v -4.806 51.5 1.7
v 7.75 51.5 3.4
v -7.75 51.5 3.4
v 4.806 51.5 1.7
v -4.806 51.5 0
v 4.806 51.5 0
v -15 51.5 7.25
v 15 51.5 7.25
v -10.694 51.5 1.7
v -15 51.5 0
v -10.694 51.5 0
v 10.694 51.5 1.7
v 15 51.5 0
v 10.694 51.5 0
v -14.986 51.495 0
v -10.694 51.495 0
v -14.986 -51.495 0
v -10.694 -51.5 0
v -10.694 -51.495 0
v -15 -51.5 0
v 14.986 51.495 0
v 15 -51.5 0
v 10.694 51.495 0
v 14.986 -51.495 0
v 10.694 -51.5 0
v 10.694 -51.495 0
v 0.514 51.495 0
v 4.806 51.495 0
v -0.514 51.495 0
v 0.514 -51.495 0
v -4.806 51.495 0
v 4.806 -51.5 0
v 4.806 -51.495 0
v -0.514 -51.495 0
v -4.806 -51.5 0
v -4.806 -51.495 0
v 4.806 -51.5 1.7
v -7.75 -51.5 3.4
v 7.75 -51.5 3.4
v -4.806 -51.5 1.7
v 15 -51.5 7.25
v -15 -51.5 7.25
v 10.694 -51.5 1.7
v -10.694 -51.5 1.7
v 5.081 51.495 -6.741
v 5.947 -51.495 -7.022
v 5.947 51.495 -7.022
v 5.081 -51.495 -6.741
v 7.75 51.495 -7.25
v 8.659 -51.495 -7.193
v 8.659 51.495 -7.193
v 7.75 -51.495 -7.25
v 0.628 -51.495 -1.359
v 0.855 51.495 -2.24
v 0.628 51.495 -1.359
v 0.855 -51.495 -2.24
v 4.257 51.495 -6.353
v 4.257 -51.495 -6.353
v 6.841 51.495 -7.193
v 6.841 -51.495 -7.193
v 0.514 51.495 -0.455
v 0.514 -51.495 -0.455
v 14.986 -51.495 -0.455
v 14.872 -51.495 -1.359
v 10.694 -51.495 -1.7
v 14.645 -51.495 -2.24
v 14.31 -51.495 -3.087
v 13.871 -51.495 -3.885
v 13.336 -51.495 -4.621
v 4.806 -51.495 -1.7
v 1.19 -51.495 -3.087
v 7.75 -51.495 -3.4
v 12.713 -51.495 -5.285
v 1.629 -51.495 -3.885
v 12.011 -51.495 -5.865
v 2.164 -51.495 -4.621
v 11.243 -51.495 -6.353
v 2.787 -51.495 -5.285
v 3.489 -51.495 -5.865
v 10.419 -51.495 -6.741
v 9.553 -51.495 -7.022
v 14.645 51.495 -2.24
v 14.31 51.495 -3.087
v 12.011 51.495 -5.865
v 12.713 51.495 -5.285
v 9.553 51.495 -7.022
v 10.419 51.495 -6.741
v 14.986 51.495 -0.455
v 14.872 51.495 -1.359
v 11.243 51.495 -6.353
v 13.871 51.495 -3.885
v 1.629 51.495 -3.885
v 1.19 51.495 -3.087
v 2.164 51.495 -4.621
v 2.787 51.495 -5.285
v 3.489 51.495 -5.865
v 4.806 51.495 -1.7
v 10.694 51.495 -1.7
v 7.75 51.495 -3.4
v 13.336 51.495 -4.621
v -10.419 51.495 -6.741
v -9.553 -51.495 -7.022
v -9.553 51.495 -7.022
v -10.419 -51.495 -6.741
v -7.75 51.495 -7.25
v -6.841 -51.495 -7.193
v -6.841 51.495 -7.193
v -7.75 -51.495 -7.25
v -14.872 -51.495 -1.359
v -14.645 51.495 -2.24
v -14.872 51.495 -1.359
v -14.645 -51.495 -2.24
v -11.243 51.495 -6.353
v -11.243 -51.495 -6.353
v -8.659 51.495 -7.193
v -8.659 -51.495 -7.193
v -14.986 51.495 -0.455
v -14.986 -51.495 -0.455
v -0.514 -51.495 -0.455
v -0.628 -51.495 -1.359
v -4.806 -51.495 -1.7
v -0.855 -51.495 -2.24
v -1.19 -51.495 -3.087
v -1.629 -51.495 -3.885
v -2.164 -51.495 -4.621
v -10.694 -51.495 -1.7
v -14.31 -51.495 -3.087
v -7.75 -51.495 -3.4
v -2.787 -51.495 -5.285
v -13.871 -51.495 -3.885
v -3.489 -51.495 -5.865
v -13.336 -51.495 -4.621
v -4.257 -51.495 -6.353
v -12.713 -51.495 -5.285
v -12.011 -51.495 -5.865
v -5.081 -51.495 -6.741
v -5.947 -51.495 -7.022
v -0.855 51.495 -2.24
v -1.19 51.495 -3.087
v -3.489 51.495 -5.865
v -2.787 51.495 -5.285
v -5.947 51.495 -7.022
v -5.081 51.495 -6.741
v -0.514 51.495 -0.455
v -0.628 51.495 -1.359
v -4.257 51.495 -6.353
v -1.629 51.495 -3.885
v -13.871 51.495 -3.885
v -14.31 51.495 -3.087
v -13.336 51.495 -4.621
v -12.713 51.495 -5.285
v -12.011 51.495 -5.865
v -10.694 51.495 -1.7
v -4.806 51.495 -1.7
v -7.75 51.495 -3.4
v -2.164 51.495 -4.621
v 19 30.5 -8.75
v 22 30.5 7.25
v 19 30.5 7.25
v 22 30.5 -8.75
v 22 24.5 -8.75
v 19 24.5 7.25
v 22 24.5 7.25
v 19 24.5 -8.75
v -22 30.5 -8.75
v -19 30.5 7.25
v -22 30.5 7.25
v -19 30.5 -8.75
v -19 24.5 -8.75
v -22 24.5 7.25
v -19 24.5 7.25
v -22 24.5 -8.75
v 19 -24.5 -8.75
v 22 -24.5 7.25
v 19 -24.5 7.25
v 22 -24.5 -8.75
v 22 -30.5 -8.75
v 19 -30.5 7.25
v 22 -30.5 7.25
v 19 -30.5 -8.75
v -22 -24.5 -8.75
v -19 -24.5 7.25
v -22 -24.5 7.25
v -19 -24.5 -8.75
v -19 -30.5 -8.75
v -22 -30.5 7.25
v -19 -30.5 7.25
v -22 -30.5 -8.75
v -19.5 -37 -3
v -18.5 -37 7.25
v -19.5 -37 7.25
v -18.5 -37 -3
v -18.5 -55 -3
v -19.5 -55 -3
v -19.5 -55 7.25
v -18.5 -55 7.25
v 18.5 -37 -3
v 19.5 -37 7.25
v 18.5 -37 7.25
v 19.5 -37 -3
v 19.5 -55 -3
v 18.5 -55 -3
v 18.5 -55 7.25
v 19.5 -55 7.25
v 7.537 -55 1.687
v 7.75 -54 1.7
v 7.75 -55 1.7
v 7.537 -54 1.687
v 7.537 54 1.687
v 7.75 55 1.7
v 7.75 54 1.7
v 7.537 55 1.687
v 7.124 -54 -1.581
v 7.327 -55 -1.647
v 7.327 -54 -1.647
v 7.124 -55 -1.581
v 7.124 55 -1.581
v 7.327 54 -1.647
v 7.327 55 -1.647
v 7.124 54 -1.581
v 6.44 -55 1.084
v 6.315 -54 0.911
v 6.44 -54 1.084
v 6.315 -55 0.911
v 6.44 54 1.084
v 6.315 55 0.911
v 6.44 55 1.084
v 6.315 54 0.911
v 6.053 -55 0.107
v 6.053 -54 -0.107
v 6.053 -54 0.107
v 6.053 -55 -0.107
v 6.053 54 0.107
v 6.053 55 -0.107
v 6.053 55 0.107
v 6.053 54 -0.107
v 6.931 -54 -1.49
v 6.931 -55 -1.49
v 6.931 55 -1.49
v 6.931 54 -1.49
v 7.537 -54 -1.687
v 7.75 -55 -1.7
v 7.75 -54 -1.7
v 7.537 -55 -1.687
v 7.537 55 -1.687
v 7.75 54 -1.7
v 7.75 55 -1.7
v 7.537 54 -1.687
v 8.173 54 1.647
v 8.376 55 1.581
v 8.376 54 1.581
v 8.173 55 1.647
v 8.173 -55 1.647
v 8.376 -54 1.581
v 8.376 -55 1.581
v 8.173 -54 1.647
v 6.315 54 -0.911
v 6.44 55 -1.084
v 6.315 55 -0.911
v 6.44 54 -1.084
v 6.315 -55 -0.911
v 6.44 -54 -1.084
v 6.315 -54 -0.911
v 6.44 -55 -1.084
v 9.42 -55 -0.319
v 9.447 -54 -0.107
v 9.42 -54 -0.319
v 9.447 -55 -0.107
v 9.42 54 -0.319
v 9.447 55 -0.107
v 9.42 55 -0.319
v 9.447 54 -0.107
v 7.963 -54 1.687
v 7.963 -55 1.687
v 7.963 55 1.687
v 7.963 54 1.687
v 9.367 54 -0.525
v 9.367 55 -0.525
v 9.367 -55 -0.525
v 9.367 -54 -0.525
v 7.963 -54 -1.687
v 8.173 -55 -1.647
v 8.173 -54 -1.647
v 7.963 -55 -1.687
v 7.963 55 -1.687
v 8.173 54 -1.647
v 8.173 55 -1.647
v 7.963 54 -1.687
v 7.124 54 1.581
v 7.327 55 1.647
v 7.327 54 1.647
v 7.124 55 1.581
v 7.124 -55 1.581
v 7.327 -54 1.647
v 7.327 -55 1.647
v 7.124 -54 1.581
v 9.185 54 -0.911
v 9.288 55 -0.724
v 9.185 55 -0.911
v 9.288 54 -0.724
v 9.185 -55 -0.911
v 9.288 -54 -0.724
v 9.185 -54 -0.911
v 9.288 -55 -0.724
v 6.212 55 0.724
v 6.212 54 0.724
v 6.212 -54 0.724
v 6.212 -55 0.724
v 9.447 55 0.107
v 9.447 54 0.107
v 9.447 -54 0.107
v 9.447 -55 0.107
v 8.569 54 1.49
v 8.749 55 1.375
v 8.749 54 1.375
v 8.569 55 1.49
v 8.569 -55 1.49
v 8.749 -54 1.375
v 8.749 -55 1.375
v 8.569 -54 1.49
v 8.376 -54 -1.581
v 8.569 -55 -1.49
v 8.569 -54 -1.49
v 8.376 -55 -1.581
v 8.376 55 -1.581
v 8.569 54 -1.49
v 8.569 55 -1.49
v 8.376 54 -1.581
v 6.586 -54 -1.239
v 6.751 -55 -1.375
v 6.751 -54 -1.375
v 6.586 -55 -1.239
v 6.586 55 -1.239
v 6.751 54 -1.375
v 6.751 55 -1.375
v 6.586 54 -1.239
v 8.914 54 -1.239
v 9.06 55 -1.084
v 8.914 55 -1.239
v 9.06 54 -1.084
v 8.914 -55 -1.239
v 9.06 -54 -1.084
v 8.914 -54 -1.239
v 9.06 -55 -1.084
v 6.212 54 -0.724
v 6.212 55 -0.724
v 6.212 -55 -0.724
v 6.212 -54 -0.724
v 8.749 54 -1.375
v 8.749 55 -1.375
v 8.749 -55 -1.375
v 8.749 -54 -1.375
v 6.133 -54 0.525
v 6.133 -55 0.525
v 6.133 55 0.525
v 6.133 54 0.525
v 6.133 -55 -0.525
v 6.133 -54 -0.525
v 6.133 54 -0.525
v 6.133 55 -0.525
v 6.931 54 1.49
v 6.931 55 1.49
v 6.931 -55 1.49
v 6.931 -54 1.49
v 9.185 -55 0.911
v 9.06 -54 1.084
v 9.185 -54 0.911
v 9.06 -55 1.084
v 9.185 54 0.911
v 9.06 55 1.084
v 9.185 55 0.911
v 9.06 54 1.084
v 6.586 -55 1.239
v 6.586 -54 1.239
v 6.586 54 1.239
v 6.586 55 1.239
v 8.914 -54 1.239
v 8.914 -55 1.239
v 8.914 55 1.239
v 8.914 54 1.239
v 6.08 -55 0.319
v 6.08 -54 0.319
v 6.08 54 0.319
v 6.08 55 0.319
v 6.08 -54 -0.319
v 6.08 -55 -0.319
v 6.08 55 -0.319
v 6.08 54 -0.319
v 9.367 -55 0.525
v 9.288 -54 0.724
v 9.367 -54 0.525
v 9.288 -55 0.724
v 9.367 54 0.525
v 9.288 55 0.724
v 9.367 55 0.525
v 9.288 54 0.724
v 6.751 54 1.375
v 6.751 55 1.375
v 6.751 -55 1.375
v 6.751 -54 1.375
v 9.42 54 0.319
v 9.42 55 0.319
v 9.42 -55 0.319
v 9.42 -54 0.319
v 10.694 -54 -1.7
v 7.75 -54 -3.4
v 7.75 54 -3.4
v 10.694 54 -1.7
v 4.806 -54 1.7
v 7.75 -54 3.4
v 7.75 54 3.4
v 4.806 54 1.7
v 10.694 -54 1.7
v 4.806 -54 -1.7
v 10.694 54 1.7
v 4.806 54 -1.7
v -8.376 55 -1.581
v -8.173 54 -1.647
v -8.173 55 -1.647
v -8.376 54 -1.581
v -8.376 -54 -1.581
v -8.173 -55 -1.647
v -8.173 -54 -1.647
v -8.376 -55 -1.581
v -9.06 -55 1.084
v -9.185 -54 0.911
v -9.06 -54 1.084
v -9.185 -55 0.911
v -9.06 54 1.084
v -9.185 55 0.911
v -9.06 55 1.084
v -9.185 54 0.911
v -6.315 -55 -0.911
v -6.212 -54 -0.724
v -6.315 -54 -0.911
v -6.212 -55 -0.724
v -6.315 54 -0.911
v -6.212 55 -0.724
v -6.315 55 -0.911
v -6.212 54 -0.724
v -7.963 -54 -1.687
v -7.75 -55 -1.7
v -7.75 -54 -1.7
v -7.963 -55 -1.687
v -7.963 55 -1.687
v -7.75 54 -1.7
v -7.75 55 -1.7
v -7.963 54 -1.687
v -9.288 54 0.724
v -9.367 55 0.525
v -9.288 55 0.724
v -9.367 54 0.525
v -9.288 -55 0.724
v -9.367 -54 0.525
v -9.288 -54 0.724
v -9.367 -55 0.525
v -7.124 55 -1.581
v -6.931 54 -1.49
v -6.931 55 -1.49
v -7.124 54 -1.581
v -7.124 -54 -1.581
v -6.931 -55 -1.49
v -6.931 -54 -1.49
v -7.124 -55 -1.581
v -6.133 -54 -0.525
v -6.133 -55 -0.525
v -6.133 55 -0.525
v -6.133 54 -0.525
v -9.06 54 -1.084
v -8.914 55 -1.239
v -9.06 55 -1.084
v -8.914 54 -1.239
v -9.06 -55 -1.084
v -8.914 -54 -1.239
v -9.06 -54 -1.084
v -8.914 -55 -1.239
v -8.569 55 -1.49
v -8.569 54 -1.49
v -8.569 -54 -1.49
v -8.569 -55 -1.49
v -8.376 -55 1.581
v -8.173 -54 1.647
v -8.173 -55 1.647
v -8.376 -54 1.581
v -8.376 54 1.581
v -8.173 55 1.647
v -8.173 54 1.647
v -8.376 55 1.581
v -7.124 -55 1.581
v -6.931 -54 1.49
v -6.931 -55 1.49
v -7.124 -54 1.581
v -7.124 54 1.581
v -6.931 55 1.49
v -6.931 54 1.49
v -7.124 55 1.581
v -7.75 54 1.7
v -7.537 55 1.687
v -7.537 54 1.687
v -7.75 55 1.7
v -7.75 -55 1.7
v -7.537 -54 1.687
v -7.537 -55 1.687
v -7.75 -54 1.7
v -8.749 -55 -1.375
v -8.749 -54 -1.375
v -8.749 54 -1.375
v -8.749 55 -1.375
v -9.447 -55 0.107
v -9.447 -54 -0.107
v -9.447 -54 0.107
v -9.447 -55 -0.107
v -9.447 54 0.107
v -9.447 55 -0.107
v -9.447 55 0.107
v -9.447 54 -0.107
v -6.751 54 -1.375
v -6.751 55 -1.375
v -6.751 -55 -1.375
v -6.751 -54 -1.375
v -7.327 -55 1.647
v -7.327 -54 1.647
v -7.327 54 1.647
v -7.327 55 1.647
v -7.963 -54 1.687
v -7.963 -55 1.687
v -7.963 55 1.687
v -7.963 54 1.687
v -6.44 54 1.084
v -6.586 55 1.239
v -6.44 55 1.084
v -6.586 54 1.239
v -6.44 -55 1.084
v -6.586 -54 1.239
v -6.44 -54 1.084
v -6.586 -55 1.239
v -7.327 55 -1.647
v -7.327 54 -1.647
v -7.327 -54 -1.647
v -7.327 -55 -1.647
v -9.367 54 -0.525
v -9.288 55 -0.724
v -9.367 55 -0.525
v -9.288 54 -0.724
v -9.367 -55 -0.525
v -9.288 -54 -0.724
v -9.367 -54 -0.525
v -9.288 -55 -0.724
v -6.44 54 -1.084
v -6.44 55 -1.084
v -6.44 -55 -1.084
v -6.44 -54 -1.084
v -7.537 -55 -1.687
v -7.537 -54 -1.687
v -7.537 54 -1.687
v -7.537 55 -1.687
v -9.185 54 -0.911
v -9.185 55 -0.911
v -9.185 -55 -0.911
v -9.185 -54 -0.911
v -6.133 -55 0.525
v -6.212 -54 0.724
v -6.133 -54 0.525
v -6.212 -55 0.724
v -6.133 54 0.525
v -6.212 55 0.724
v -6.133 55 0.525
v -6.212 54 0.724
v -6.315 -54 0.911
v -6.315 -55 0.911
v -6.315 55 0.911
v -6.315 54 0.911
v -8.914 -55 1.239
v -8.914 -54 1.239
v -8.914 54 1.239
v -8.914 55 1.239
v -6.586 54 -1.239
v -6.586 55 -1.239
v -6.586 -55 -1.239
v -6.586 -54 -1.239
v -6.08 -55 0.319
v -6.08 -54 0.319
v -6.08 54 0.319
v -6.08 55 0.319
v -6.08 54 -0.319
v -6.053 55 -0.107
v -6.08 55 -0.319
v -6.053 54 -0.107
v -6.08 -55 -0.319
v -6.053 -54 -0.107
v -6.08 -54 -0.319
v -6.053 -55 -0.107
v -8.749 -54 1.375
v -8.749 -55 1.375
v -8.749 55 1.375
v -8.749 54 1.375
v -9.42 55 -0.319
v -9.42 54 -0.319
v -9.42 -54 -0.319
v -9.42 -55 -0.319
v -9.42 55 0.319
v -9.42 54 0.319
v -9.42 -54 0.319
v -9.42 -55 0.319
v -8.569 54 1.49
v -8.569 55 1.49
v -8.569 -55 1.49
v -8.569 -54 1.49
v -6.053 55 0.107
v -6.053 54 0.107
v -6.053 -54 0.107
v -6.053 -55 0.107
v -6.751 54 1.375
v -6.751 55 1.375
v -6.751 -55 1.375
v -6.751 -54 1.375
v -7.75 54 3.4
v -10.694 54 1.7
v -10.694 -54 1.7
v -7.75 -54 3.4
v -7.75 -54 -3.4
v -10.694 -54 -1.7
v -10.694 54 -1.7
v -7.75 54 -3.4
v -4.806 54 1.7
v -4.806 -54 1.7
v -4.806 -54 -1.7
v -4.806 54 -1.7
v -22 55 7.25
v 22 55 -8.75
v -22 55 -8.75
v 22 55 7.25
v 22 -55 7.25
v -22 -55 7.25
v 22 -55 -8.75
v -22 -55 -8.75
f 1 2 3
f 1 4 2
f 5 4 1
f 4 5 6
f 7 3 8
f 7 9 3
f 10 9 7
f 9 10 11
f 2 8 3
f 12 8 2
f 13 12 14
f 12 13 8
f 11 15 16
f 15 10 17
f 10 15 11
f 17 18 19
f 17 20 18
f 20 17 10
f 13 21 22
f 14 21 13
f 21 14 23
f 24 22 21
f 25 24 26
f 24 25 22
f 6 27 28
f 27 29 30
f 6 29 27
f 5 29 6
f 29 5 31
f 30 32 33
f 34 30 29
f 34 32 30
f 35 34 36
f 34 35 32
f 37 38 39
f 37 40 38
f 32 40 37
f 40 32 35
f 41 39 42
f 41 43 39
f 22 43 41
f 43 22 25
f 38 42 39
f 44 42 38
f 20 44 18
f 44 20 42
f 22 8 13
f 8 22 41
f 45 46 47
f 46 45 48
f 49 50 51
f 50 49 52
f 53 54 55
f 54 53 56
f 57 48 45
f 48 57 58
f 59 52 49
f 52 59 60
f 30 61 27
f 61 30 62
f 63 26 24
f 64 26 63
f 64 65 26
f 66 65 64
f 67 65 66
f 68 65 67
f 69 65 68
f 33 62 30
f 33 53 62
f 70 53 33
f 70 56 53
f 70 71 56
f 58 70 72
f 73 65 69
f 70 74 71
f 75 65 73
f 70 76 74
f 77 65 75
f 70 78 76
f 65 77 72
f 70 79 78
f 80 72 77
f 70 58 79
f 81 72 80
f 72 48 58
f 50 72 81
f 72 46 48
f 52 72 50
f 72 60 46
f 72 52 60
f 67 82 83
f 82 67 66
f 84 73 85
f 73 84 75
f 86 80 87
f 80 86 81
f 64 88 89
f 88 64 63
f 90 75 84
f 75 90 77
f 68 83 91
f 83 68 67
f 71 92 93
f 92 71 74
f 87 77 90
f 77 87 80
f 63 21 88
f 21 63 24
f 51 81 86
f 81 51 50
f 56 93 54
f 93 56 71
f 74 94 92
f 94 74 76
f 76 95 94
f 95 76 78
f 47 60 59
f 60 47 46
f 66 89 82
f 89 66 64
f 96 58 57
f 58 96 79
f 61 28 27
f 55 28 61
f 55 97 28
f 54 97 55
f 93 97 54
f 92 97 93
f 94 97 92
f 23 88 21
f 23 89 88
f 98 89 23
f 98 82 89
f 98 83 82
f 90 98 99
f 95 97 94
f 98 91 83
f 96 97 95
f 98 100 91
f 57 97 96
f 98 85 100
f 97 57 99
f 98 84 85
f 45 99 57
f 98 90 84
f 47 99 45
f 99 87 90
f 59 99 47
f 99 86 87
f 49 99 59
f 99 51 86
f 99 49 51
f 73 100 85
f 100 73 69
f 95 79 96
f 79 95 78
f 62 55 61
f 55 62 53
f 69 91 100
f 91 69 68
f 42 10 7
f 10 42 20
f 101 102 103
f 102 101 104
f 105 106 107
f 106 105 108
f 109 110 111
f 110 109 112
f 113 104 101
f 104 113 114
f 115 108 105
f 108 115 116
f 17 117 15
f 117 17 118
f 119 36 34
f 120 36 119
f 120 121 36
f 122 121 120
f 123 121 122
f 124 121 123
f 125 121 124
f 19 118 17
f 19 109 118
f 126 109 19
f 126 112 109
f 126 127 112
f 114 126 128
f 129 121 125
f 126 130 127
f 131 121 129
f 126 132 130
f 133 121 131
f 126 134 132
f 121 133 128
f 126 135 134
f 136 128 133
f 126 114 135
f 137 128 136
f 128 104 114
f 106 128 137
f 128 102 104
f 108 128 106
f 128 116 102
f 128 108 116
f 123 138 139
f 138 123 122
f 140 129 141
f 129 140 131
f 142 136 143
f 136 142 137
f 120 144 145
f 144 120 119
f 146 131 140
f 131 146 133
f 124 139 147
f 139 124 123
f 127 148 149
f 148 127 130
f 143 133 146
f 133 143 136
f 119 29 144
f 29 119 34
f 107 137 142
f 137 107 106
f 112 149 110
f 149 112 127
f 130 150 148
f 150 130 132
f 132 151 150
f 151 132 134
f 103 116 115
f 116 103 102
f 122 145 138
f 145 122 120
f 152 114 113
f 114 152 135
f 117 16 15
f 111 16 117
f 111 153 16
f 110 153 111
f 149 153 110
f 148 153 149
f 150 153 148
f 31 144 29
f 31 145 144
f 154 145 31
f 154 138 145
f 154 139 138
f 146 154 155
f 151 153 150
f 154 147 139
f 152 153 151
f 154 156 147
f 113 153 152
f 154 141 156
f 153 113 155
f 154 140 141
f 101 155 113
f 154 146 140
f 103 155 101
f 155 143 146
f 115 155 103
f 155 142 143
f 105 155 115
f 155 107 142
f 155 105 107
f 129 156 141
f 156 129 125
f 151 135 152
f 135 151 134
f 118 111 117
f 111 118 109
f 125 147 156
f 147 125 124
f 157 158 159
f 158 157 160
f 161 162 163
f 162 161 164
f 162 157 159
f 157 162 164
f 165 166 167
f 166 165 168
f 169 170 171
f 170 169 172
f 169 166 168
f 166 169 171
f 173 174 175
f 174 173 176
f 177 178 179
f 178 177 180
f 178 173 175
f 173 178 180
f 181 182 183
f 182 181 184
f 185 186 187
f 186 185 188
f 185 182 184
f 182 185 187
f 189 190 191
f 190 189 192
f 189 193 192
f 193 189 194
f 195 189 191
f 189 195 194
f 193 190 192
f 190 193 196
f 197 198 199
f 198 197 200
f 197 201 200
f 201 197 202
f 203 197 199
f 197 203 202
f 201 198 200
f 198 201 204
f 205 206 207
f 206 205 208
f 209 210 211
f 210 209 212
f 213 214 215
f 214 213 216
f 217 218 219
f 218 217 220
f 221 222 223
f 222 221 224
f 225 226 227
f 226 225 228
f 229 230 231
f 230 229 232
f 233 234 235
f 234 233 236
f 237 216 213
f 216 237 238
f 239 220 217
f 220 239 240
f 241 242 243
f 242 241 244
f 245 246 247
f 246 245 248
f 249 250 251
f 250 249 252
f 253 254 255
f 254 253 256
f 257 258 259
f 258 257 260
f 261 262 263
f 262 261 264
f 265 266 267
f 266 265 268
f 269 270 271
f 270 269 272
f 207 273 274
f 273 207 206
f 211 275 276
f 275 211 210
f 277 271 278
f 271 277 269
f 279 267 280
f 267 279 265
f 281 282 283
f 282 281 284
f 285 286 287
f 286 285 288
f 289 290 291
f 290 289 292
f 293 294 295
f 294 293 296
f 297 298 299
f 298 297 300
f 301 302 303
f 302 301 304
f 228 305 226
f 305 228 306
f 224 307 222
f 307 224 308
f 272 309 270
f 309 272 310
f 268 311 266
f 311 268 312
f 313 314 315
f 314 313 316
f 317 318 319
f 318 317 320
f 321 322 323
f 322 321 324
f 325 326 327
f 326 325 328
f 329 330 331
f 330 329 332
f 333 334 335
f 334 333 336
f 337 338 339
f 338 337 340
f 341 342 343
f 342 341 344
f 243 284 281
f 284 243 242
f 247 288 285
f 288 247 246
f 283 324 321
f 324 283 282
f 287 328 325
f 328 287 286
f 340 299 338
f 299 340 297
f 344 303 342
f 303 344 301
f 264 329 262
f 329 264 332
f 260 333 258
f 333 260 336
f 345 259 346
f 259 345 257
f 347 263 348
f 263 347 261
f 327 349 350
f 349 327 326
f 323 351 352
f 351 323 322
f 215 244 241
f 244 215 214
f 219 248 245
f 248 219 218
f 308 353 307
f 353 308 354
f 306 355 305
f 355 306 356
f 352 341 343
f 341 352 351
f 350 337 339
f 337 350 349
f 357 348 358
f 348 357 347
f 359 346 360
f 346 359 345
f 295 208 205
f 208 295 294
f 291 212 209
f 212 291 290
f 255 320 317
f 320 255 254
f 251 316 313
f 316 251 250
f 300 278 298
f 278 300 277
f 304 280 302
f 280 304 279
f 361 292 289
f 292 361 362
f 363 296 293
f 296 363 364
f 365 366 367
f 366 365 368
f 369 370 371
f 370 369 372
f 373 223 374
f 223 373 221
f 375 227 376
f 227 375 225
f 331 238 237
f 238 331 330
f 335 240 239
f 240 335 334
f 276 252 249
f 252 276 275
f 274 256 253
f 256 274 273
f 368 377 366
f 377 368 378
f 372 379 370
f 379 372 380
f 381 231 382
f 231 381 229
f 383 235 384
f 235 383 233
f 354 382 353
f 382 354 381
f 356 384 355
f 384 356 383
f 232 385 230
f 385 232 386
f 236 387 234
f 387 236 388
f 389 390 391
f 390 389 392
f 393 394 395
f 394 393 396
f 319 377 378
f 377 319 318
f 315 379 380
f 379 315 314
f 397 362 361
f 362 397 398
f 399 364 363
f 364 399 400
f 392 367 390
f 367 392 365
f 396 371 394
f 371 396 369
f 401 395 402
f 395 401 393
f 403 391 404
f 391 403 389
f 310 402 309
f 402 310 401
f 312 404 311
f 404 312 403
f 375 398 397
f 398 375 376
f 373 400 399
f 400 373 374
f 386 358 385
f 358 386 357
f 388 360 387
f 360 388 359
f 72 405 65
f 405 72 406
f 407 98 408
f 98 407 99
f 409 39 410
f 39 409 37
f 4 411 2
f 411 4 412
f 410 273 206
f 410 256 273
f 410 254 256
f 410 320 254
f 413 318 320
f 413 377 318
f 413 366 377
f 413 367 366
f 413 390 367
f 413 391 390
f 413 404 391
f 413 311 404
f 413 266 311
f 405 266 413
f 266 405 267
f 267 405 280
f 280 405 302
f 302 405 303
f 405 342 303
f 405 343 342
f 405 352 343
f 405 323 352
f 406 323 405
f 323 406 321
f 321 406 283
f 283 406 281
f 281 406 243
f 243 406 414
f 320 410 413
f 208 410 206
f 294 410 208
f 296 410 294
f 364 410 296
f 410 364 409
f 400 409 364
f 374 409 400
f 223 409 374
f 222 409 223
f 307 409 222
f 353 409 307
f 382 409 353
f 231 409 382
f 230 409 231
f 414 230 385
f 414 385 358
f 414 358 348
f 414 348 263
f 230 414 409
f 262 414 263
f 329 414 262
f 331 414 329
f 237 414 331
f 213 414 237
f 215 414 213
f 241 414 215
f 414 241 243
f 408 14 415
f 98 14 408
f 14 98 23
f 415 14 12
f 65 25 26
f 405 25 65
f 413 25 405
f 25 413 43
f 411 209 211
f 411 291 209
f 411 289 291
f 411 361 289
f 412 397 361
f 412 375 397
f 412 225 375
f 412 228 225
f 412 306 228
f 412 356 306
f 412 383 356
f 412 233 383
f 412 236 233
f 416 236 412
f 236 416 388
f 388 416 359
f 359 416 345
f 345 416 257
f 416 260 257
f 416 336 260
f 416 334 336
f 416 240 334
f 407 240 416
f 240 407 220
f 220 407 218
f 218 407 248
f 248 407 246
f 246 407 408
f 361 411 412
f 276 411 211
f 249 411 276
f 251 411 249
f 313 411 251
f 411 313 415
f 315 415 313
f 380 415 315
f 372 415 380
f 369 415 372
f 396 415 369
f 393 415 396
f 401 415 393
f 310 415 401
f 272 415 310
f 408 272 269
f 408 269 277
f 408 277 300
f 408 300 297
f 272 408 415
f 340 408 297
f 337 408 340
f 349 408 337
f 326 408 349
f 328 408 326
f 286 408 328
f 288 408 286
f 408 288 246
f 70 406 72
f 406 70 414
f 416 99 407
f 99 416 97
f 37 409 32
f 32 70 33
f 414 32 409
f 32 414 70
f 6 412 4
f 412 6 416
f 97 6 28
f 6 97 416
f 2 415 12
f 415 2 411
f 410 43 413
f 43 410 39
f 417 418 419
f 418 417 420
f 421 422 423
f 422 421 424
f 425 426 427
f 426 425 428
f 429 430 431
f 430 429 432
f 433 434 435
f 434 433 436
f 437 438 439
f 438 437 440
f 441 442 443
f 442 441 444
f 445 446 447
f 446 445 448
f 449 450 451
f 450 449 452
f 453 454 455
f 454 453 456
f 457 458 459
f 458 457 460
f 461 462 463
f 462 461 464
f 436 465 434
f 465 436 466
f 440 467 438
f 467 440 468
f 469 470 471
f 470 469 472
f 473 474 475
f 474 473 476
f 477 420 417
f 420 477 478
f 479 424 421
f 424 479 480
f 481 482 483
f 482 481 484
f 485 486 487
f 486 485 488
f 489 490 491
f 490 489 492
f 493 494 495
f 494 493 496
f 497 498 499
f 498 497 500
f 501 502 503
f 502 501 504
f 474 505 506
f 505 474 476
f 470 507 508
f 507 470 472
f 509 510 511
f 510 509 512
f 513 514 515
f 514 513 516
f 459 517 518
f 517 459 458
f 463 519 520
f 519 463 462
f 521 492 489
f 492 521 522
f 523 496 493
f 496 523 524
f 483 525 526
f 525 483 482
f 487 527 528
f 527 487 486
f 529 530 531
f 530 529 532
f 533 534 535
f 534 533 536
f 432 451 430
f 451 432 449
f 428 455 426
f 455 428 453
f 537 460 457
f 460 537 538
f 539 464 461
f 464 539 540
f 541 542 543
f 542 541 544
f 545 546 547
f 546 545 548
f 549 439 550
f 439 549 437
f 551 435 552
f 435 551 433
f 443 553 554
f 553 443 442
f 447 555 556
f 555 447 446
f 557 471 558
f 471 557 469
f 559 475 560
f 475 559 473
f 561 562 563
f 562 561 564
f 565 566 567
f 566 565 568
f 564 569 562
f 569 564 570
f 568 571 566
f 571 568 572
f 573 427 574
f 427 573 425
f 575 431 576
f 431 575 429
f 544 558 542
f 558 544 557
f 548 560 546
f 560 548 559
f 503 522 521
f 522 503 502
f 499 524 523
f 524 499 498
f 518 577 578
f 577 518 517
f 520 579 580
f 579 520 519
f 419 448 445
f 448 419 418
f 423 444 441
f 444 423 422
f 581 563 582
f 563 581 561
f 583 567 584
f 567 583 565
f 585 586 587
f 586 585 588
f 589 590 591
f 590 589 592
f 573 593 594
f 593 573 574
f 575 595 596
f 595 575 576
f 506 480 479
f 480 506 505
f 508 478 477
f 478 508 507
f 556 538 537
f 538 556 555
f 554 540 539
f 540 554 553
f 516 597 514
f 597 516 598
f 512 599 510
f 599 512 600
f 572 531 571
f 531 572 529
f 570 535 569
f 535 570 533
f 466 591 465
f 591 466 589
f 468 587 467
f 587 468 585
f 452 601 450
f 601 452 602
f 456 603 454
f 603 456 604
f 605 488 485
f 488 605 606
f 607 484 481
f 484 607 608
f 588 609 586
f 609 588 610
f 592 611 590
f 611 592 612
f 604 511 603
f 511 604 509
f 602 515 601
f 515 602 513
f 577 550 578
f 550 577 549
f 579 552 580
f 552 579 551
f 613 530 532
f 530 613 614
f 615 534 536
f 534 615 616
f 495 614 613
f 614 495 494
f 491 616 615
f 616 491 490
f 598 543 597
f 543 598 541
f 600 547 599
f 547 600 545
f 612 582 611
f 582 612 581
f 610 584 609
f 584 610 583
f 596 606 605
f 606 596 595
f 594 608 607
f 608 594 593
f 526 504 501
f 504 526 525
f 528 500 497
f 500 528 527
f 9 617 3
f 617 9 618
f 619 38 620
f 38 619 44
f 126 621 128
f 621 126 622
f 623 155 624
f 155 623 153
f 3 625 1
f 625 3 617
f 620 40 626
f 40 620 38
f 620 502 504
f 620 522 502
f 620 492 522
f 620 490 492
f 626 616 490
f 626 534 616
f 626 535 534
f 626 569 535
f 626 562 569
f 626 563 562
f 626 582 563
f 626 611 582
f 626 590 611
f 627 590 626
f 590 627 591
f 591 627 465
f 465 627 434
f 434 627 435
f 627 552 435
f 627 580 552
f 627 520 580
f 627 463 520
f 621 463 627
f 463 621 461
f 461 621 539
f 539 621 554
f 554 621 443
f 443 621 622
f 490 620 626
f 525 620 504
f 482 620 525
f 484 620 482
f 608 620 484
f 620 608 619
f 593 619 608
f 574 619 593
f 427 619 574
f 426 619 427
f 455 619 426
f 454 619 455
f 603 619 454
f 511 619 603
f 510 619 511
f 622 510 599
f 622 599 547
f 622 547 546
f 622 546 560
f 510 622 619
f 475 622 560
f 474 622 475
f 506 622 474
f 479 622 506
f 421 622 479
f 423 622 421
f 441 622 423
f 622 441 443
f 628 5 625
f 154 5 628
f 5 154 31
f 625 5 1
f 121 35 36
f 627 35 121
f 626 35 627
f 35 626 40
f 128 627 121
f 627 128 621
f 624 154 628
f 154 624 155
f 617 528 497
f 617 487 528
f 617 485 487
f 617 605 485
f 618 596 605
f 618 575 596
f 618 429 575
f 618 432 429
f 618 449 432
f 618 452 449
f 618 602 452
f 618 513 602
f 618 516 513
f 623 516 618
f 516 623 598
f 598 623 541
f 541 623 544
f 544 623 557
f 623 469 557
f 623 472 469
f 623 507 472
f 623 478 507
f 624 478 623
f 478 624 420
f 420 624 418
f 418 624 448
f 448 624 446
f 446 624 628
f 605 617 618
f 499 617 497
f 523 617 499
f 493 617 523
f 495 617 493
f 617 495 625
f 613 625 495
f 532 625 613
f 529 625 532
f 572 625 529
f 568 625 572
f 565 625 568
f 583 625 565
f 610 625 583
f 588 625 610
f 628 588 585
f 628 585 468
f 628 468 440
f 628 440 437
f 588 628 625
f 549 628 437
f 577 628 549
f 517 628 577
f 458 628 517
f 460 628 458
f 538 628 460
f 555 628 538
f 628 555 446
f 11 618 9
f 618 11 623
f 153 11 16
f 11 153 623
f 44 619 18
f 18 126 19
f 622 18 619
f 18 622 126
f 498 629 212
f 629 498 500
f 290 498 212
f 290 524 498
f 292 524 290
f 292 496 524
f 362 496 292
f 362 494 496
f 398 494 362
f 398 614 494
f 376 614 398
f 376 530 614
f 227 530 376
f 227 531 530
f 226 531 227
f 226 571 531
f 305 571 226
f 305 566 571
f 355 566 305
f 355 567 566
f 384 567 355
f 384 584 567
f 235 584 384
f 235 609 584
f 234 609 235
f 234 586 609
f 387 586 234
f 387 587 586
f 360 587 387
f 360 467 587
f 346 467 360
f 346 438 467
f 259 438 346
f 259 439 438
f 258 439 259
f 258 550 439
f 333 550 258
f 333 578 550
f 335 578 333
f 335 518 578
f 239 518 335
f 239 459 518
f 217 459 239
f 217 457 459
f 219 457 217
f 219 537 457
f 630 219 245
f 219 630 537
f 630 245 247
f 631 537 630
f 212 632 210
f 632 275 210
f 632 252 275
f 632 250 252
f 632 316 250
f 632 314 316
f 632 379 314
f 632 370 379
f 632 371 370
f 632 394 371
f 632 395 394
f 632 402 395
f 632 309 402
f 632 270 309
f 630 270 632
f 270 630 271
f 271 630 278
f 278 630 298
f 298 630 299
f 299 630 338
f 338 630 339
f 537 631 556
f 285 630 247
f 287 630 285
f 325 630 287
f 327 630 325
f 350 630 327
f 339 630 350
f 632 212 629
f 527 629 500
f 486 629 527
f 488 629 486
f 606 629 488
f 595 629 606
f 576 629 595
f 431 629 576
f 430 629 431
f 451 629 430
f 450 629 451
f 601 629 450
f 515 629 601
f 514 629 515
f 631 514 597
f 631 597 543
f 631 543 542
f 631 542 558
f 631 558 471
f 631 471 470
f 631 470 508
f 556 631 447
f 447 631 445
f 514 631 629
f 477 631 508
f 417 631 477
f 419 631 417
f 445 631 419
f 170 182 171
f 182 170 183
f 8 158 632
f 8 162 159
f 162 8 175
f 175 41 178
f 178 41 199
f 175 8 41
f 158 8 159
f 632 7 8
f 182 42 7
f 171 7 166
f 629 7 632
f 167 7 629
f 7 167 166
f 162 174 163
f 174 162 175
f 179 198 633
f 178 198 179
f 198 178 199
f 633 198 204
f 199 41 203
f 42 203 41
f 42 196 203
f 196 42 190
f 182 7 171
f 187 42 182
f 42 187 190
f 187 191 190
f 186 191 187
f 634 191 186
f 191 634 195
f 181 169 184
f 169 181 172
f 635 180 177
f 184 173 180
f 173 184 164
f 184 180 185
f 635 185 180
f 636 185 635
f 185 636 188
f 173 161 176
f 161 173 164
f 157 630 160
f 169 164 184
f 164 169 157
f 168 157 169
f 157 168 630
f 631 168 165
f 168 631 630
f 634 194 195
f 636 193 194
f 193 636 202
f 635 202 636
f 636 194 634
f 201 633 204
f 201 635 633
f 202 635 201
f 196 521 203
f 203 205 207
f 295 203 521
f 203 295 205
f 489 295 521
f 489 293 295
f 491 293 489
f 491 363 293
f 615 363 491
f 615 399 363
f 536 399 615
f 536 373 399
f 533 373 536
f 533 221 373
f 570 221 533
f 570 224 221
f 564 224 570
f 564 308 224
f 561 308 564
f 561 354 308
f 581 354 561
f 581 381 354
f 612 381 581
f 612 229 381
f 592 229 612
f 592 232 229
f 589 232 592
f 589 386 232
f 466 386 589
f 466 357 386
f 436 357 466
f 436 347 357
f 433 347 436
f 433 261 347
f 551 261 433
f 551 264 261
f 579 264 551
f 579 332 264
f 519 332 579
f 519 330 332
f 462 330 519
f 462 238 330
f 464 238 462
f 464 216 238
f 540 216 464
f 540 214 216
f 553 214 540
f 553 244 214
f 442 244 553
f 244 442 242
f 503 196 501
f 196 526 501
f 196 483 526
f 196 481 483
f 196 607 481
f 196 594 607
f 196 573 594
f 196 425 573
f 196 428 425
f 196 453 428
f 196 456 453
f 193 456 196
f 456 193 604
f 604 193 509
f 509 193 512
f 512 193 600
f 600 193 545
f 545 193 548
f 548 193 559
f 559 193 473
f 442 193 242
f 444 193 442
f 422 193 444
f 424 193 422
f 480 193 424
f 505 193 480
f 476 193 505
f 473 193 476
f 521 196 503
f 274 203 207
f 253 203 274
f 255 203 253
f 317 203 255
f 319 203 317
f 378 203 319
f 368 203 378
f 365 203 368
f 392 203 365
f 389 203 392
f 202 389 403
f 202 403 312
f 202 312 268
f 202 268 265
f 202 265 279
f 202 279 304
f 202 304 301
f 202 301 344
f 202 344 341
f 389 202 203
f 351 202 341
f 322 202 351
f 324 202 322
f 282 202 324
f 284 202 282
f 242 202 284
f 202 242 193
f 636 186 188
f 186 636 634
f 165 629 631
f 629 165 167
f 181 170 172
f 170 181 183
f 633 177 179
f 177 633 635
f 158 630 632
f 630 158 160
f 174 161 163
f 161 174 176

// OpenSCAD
/***************************************************************
 Parameterized Battery pack with electrical connections
  (c) 2010 Juan Gonzalez-Gomez (Obijuan) juan@iearobotics.com
   This design is derived from the Battery comparment generator
   (c) Nikolaus Gradwohl (guru (at) local-guru.net)
    http://www.thingiverse.com/thing:5051
Other contributors:
  * Chris Thompson (http://eagleapex.com/): Connection in series along the case
 -----------------------------------------------------------
 The nuts (two per battery) are embedded into the battery pack. 
 The screws (two per battery) are inserted from the outside and
 touch the batteries.
-----------------------------------------------------------
GPL LICENCE
****************************************************************/

//-- Battery sizes

AA = [ 14.5, 51.5 ];
AAA = [ 10.5,44.5 ];
C = [ 26.2, 50 ];
D = [ 34.2, 61.5 ]; 

// CHOOSE BATTERY TYPE AND COUNT 
typ = AA;
num =2;


//---------------------------------
//-- Battery pack parameters
//-- Can be set by the user
//---------------------------------

//-- Battery pack thickness
bottom_thick=1.5;
fr_thick=3.5;    //-- Front and rear parts
side_thick=2;    //-- Side part

//-- Distance beween batteries
distance_bat=1;

//-- Nut parameters
nut_h = 2.5;
nut_radius = 6.8/2;
nut_drill = 3.4;

//------------------------------
//-- IMPLEMENTATION
//------------------------------
//-- Battery dimensions: width, height and length. Change ser for batteries in series along the case.  

ser=2;
w=typ[0];
h=w;
l=typ[1]*ser;

//-- Dimensions of the inner part of the compartiment
ip_l = l;
ip_w = w + (w+distance_bat)*(num-1);
ip_h = h;

//-- Dimensions of the mother cube
mc_l = ip_l+2*fr_thick;
mc_w = ip_w+2*side_thick;
mc_h = ip_h+bottom_thick;
pad = 10;

module notch() {
  translate([0,-(mc_w+pad)/2, 0]) {
    cube(size=[6, 6, 40], center=true);
    translate([0,mc_w+pad,0]) {
      cube(size=[6, 6, 40], center=true);
    }
  }
}

module slots() {
  translate([-mc_l/2 + 8, (mc_w+pad)/2 - 3, mc_h/2 - 1])
  cube(size=[20, 1, 20], center=true);
  translate([-mc_l/2 + 8, -(mc_w+pad)/2+3, mc_h/2 - 1])
  cube(size=[20, 1, 20], center=true);
}

//-- The process of building the battery pack is just substracting
//-- things to the mother cube
module casing() {
rotate([0,0,90]) {
  difference() {
    //-- The mother cube
     translate([0,0,-bottom_thick/2])
      cube(size=[mc_l, mc_w+pad, mc_h],center=true);

    //-- Array of batteries
    translate([0,0,h/2])
    cube(size=[ip_l,ip_w,ip_h],center=true);

    translate([0,-mc_w/2+w/2+side_thick,0])
    for ( i = [0:num-1] ) {

      translate([0,i*(w+distance_bat),0])
      union() {
        translate([0,0,h/2])
           cube(size=[l,w,h],center=true);

        rotate([0,90,0])
          cylinder(r=w/2, h=l-0.01, center=true, $fn=50); 
      }
    }

    translate([mc_l/4, 0, 0]) {
      notch();
    }
    translate([-mc_l/4, 0, 0]) {
      notch();
    }

    slots();
    

    //-- Array of contacts
    translate([0,-mc_w/2+w/2+side_thick,0])
    for ( i = [0:num-1] ) {
      //-- Drills
      translate([0,i*(w+distance_bat),0])
      rotate([0,90,0])
      cylinder(center=true,h=l+20, r=nut_drill/2, $fn=50, center=true);

      //-- Room for the embedded nuts
      translate([0,i*(w+distance_bat),0])
      rotate([0,90,0]) 
      cylinder(h=l+2*nut_h, r=nut_radius, $fn=6, center=true);
    }
  }
}
}

casing();
